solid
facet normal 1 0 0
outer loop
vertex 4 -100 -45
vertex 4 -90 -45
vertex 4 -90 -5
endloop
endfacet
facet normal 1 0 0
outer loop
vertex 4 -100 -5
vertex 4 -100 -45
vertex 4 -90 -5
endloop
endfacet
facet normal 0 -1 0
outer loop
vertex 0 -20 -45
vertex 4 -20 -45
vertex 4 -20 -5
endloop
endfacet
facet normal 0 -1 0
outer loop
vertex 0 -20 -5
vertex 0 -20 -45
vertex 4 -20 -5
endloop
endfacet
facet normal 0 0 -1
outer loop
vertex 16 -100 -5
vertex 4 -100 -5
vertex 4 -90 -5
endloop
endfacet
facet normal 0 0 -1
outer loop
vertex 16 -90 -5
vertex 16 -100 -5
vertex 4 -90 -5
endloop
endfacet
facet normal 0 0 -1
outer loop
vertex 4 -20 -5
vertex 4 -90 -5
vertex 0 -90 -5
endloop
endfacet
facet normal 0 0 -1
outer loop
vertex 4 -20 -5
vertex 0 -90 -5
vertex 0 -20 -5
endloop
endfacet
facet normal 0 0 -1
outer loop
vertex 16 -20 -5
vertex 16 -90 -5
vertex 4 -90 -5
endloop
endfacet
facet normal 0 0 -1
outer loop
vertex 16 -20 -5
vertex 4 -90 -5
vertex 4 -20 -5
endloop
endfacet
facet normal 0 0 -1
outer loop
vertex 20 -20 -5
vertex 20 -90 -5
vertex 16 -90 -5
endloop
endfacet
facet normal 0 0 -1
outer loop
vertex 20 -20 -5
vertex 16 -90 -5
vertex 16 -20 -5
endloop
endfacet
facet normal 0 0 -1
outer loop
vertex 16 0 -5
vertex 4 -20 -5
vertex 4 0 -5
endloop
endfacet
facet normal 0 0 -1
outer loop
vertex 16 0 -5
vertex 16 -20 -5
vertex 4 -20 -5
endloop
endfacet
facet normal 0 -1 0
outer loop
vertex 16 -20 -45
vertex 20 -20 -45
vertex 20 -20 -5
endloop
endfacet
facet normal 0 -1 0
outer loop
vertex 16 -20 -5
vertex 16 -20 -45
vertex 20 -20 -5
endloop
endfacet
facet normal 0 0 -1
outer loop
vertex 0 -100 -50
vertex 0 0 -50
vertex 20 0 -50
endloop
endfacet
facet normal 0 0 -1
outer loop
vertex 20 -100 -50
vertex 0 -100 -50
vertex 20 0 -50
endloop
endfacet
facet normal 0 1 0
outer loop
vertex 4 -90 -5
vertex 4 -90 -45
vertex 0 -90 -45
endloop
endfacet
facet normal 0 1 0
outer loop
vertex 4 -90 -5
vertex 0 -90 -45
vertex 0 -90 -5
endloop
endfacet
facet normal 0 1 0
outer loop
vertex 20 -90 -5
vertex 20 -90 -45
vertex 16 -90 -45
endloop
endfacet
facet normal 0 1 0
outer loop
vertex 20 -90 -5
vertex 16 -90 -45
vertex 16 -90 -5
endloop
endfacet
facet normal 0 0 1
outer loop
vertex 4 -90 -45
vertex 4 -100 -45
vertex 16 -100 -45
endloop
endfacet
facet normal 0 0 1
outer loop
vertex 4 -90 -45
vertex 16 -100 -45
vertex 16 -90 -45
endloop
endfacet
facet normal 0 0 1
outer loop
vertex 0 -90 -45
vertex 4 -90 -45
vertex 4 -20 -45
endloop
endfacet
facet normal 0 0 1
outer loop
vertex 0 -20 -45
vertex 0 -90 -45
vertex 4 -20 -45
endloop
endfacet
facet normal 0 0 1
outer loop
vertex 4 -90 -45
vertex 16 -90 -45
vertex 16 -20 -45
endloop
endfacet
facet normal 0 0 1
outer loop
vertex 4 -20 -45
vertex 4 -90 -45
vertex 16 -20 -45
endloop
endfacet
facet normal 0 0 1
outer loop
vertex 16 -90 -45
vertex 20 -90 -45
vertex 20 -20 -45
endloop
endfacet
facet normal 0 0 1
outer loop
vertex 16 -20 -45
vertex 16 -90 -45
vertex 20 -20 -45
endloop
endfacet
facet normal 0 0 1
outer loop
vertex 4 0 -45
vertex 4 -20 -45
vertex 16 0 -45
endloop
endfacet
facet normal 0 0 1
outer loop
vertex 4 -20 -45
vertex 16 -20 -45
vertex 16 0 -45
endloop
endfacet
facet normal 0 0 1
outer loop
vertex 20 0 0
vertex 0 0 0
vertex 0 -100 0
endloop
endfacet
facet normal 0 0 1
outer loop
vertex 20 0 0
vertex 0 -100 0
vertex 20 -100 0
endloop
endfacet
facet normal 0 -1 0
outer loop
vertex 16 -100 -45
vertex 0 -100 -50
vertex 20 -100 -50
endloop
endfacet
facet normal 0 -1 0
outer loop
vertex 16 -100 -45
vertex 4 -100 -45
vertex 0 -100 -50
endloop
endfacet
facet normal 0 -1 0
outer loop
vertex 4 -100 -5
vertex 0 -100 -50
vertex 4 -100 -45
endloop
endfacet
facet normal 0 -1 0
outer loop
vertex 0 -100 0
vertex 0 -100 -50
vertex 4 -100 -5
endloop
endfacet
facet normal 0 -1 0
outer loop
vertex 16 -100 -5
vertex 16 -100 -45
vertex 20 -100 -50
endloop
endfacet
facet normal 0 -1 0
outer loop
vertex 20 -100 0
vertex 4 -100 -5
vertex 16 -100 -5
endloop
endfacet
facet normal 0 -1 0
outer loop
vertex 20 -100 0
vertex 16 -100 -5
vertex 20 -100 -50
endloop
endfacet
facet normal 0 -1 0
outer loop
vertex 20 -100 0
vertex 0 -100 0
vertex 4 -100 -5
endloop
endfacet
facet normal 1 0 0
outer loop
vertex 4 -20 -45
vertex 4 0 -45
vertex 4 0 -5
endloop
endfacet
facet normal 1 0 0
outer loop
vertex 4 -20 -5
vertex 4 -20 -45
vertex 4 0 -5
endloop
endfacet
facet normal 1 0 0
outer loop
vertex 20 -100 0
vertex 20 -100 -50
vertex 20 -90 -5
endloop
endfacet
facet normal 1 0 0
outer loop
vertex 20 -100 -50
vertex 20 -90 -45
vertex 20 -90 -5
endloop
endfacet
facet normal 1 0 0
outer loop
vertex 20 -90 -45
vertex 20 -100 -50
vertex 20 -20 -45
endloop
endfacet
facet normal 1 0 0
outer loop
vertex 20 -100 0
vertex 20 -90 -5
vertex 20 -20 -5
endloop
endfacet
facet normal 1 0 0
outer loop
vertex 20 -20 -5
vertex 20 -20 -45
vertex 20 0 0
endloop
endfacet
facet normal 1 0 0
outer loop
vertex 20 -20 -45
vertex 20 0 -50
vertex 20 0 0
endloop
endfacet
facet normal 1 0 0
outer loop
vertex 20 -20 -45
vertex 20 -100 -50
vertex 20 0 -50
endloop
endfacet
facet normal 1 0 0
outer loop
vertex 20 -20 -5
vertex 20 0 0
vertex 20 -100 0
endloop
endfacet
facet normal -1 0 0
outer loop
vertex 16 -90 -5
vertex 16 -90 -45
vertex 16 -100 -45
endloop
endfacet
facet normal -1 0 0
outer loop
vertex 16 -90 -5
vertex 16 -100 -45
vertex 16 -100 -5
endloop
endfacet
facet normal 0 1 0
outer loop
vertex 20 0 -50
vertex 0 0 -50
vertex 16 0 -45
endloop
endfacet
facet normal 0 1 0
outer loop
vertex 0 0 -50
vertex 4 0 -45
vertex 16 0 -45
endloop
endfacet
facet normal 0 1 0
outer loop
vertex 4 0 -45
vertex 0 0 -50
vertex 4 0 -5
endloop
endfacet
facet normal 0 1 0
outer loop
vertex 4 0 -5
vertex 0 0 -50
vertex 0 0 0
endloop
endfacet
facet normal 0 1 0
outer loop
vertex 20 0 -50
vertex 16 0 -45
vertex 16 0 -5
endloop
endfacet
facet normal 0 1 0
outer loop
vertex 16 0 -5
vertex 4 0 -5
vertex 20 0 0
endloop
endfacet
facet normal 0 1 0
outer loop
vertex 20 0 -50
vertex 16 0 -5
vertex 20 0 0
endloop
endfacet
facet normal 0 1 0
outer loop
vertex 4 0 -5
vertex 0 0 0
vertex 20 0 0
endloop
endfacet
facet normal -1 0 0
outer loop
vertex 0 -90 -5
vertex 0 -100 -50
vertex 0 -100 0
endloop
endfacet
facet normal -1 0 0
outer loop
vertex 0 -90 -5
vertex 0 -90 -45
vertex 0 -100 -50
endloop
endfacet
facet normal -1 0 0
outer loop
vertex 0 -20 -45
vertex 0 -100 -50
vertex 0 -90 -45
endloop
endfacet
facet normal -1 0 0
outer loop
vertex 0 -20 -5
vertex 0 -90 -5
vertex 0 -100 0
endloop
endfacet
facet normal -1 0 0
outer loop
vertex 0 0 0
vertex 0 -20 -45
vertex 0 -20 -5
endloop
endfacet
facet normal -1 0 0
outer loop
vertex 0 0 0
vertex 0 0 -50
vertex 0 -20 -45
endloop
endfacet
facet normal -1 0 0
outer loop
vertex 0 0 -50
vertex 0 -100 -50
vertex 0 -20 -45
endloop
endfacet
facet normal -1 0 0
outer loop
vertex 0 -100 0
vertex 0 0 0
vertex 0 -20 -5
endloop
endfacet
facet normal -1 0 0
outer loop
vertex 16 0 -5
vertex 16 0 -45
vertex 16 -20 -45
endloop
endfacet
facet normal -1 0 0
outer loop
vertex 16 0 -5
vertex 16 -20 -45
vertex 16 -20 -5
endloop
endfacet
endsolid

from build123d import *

# Parameters (mm, degrees)
F0_W     = 20
F0_H     = 50
F0_W_2   = 12
F0_H_2   = 40
F1_DEPTH = 100
F2_W     = 70
F2_H     = 40
F3_DEPTH = 25


with BuildPart() as f1:
    # F0 (on Front) → F1 (new body)
    with BuildSketch(Plane.XZ):
        with Locations((10, -25)):
            Rectangle(F0_W, F0_H)
        with Locations((10, -25)):
            Rectangle(F0_W_2, F0_H_2, mode=Mode.SUBTRACT)
    extrude(amount=F1_DEPTH)

    # F2 (on face) → F3 (cut)
    with BuildSketch(Plane.YZ.offset(20)):
        with Locations((-55, -25)):
            Rectangle(F2_W, F2_H)
    extrude(amount=-F3_DEPTH, mode=Mode.SUBTRACT)


solid = f1.part
